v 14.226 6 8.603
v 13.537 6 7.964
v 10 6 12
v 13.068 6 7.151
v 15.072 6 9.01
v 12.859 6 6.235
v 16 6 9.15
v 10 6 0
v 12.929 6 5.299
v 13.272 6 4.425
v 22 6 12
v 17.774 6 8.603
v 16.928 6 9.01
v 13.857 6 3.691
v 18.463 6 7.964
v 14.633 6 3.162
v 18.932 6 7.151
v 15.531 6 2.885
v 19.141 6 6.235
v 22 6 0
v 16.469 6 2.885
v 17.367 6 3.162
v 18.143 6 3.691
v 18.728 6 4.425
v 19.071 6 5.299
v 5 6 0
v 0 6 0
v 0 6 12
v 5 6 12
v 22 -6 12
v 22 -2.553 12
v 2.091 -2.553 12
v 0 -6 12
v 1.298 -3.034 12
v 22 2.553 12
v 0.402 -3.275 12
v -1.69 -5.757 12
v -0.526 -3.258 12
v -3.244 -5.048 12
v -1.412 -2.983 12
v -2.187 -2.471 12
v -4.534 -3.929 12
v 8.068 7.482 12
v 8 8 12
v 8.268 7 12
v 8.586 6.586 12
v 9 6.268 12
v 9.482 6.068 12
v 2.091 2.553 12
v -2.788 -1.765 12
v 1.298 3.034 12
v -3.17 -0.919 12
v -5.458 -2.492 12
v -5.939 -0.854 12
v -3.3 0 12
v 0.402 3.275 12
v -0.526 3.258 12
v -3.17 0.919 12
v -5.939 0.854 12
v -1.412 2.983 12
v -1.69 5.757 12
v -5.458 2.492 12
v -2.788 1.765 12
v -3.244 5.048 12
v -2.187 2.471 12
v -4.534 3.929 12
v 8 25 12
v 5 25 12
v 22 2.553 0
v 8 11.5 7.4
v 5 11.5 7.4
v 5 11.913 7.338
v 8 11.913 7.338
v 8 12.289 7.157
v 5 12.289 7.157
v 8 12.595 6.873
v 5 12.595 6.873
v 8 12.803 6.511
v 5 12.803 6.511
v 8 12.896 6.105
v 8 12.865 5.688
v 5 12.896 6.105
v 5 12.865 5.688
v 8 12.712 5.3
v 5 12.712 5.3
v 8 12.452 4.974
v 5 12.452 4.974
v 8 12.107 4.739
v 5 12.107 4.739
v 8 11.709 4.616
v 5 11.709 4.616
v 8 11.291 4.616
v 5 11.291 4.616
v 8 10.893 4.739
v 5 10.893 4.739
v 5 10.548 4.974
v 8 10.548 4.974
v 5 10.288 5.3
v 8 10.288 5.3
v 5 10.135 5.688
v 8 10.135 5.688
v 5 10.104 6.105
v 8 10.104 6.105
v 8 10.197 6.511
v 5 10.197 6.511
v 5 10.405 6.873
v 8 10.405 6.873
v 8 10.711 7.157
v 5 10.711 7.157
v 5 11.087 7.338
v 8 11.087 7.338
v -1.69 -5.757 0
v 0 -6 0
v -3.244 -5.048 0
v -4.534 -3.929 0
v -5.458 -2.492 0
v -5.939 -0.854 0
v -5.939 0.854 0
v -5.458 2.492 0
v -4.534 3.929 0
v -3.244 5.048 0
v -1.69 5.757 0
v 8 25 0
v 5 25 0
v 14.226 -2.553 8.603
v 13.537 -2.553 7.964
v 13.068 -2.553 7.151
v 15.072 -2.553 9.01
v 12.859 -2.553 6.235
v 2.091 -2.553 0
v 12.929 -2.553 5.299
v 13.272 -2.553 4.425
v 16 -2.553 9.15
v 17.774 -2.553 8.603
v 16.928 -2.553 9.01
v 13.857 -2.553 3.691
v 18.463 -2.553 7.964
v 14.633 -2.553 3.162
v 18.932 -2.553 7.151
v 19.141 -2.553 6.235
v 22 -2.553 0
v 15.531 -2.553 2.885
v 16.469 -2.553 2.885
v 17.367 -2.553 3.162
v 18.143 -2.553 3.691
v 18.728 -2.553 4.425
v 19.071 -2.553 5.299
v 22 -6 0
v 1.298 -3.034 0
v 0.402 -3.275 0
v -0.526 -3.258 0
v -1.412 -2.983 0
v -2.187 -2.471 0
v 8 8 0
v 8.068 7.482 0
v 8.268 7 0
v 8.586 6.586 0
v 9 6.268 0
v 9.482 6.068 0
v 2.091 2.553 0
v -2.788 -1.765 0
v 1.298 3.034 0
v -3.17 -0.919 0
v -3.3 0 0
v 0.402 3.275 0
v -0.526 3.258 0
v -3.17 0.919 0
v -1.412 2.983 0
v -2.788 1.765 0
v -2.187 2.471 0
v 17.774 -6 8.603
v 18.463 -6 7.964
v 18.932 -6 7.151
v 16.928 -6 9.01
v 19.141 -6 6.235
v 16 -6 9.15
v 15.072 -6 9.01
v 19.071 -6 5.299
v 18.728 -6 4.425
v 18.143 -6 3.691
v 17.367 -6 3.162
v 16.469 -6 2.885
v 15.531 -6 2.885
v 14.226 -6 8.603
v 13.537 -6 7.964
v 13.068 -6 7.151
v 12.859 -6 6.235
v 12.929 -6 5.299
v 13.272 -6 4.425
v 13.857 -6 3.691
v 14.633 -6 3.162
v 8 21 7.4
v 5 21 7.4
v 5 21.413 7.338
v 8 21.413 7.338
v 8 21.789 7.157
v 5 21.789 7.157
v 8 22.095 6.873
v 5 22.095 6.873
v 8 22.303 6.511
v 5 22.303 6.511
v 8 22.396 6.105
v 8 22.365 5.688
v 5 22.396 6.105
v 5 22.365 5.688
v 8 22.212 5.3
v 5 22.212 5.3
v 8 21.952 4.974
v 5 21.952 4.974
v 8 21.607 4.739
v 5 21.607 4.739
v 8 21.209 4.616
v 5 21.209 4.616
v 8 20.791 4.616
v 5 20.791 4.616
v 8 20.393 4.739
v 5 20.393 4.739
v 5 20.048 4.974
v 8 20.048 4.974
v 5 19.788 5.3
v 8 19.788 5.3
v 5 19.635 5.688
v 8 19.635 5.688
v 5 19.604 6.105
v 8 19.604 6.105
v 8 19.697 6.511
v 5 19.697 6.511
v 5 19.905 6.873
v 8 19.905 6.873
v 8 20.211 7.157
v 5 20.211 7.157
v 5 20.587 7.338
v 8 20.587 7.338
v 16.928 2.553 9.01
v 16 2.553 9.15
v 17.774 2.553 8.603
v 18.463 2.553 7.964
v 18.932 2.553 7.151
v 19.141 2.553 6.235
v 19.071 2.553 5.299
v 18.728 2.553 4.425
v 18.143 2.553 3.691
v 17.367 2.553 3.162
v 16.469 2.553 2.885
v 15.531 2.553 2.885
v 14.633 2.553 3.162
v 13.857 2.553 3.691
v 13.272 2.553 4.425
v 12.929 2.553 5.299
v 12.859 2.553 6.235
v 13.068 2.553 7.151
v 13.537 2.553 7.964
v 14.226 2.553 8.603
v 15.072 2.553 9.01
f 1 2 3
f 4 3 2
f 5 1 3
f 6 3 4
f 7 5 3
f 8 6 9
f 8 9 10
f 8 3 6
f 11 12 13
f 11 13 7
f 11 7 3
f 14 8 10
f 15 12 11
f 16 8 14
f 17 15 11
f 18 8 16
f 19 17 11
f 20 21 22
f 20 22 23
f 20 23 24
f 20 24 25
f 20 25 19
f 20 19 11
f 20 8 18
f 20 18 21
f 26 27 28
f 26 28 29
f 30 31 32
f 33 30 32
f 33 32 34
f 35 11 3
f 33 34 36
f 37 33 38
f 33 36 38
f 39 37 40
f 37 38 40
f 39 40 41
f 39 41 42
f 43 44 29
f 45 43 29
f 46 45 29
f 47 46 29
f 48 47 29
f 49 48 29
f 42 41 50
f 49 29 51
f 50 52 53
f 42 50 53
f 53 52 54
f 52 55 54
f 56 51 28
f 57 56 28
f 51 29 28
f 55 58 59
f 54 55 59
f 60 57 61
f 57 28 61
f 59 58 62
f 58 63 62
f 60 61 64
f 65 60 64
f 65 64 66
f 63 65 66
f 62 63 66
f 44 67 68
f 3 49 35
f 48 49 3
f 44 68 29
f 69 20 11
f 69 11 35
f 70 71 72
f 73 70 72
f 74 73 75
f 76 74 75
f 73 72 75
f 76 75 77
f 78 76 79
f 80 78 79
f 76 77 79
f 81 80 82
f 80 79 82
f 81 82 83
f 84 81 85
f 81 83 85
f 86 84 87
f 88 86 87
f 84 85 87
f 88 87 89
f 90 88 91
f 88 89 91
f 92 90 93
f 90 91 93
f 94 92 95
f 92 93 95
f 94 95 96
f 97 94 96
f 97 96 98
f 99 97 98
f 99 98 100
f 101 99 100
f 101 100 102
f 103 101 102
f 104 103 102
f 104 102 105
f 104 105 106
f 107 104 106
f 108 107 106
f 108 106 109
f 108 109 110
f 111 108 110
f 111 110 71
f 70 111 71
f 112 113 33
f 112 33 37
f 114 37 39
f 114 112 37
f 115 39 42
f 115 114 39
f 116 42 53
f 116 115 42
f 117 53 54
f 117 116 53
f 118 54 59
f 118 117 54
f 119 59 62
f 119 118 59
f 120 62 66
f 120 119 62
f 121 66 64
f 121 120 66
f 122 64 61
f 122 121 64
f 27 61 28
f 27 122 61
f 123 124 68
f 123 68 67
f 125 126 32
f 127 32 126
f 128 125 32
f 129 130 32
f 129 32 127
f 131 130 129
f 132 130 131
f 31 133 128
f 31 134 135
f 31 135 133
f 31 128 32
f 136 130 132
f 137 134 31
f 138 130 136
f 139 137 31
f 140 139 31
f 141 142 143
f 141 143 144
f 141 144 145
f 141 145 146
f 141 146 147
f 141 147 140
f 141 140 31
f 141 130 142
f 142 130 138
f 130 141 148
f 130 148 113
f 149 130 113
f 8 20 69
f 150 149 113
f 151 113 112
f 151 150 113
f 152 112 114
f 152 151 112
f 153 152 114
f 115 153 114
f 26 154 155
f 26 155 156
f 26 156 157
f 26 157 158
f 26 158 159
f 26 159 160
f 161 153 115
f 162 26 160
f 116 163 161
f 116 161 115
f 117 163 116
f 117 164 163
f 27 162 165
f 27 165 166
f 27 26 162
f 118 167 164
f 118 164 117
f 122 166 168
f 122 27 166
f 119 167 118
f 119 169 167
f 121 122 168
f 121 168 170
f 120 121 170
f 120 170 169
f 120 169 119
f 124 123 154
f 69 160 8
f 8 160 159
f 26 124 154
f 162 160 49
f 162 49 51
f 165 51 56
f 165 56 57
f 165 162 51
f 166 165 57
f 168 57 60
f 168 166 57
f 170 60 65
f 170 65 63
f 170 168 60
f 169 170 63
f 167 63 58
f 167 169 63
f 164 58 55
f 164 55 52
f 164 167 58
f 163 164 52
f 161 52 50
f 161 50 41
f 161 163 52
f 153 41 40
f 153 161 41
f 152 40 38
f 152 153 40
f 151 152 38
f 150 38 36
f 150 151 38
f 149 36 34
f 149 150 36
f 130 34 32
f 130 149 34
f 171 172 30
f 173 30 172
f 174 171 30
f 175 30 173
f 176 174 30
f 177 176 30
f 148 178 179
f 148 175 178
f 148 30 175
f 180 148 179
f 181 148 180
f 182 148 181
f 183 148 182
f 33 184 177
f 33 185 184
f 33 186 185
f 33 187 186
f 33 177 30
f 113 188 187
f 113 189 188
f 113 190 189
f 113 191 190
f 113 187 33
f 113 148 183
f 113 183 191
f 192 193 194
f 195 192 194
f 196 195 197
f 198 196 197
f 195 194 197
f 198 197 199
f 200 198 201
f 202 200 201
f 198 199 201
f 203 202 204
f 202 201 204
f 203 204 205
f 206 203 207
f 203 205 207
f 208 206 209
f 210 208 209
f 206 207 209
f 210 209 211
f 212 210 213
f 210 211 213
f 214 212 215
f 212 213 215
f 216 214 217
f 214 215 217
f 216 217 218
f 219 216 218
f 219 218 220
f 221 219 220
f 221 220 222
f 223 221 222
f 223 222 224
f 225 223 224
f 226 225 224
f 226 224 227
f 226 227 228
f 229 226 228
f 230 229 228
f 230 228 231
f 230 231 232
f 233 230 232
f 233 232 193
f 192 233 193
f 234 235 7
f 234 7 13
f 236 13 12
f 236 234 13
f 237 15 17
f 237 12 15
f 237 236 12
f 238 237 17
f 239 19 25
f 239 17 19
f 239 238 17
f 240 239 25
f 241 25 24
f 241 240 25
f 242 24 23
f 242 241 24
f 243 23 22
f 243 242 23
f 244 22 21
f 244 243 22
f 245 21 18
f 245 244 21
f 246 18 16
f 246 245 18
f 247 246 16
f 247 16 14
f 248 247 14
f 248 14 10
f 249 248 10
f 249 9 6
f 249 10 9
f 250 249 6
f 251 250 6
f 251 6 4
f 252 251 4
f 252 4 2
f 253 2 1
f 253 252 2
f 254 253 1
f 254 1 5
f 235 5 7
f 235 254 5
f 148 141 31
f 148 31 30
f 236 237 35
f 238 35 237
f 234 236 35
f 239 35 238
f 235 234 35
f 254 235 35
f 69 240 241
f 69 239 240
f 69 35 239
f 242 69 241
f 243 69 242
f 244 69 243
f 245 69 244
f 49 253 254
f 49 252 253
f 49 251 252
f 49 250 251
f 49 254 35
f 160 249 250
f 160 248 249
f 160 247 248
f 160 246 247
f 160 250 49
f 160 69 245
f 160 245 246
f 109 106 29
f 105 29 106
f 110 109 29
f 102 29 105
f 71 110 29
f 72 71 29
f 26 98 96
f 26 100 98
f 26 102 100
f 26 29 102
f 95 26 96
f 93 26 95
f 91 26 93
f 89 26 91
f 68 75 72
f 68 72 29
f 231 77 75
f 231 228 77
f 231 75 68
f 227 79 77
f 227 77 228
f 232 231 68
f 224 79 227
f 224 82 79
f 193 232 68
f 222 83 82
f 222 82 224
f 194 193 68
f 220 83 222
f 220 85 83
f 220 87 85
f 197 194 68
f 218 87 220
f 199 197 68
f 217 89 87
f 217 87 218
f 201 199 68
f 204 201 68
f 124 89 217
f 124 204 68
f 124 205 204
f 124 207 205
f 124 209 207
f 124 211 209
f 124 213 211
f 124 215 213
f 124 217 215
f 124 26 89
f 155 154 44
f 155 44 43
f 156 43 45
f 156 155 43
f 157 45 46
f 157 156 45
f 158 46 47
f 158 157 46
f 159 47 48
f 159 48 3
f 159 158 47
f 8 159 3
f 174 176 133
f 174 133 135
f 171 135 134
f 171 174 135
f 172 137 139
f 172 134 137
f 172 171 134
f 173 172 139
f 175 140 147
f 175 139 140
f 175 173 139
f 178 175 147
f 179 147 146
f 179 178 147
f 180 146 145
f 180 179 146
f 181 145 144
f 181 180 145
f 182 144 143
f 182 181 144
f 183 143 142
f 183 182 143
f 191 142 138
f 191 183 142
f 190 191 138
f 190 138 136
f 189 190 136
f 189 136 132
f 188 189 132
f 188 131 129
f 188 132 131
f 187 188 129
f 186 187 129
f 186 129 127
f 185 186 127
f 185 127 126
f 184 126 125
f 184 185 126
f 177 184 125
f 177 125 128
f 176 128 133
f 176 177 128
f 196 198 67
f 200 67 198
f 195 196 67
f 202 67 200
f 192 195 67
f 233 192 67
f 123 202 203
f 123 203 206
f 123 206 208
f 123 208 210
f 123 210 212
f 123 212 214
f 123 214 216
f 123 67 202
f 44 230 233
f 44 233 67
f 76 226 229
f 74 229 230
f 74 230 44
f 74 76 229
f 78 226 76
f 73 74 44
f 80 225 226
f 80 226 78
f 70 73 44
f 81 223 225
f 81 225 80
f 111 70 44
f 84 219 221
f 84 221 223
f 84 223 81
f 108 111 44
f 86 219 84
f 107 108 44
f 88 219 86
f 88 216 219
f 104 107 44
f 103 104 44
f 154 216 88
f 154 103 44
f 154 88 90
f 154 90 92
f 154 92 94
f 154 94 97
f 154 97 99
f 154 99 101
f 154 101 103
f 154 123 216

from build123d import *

# Parameters (mm, degrees)
BOSS_EXTRUDE1_DEPTH     = 12
CUT_EXTRUDE1_DEPTH      = 36.397740041
CUT_EXTRUDE1_DEPTH_BACK = 36.397740041
SKETCH2_R               = 3.15
CUT_EXTRUDE2_REACH      = 34.527
SKETCH3_R               = 1.4


with BuildPart() as part:
    # Sketch1 → Boss-Extrude1 (new body)
    with BuildSketch(Plane.XY):
        with BuildLine():
            Line((10, 6), (22, 6))
            Line((22, 6), (22, 2.552710574))
            Line((22, 2.552710574), (2.091331807, 2.552710574))
            ThreePointArc((2.091331807, 2.552710574), (-3.3, 0), (2.091331807, -2.552710574))
            Line((2.091331807, -2.552710574), (22, -2.552710574))
            Line((22, -2.552710574), (22, -6))
            Line((22, -6), (0, -6))
            ThreePointArc((0, -6), (-6, 0), (0, 6))
            Line((0, 6), (5, 6))
            Line((5, 6), (5, 25))
            Line((5, 25), (8, 25))
            Line((8, 25), (8, 8))
            ThreePointArc((8, 8), (8.585786438, 6.585786438), (10, 6))
        make_face()
    extrude(amount=BOSS_EXTRUDE1_DEPTH)

    # Sketch2 → Cut-Extrude1 (cut, two sides: drawn at the far end of the back side and taken through both)
    with BuildSketch(Plane(origin=(0, 0, 0), x_dir=(1, 0, 0), z_dir=(0, 1, 0)).offset(-CUT_EXTRUDE1_DEPTH_BACK)):
        with Locations(Location((16, -6, 0), (0, 0, 270))):
            Circle(SKETCH2_R)
    extrude(amount=CUT_EXTRUDE1_DEPTH + CUT_EXTRUDE1_DEPTH_BACK, mode=Mode.SUBTRACT)

    # Sketch3 → Cut-Extrude2 (cut, up to next)
    with BuildSketch(Plane.ZY.offset(-5), mode=Mode.PRIVATE) as cut_extrude2_sk1:
        with Locations((6, 21)):
            Circle(SKETCH3_R)
    cut_extrude2_tool1 = extrude(cut_extrude2_sk1.sketch, amount=-CUT_EXTRUDE2_REACH, mode=Mode.PRIVATE) & part.part
    # Sketch3 → Cut-Extrude2 (cut, up to next)
    with BuildSketch(Plane.ZY.offset(-5), mode=Mode.PRIVATE) as cut_extrude2_sk2:
        with Locations((6, 11.5)):
            Circle(SKETCH3_R)
    cut_extrude2_tool2 = extrude(cut_extrude2_sk2.sketch, amount=-CUT_EXTRUDE2_REACH, mode=Mode.PRIVATE) & part.part
    add(cut_extrude2_tool1.solids().sort_by_distance((5, 21, 6))[0], mode=Mode.SUBTRACT)
    add(cut_extrude2_tool2.solids().sort_by_distance((5, 11.5, 6))[0], mode=Mode.SUBTRACT)


solid = part.part
